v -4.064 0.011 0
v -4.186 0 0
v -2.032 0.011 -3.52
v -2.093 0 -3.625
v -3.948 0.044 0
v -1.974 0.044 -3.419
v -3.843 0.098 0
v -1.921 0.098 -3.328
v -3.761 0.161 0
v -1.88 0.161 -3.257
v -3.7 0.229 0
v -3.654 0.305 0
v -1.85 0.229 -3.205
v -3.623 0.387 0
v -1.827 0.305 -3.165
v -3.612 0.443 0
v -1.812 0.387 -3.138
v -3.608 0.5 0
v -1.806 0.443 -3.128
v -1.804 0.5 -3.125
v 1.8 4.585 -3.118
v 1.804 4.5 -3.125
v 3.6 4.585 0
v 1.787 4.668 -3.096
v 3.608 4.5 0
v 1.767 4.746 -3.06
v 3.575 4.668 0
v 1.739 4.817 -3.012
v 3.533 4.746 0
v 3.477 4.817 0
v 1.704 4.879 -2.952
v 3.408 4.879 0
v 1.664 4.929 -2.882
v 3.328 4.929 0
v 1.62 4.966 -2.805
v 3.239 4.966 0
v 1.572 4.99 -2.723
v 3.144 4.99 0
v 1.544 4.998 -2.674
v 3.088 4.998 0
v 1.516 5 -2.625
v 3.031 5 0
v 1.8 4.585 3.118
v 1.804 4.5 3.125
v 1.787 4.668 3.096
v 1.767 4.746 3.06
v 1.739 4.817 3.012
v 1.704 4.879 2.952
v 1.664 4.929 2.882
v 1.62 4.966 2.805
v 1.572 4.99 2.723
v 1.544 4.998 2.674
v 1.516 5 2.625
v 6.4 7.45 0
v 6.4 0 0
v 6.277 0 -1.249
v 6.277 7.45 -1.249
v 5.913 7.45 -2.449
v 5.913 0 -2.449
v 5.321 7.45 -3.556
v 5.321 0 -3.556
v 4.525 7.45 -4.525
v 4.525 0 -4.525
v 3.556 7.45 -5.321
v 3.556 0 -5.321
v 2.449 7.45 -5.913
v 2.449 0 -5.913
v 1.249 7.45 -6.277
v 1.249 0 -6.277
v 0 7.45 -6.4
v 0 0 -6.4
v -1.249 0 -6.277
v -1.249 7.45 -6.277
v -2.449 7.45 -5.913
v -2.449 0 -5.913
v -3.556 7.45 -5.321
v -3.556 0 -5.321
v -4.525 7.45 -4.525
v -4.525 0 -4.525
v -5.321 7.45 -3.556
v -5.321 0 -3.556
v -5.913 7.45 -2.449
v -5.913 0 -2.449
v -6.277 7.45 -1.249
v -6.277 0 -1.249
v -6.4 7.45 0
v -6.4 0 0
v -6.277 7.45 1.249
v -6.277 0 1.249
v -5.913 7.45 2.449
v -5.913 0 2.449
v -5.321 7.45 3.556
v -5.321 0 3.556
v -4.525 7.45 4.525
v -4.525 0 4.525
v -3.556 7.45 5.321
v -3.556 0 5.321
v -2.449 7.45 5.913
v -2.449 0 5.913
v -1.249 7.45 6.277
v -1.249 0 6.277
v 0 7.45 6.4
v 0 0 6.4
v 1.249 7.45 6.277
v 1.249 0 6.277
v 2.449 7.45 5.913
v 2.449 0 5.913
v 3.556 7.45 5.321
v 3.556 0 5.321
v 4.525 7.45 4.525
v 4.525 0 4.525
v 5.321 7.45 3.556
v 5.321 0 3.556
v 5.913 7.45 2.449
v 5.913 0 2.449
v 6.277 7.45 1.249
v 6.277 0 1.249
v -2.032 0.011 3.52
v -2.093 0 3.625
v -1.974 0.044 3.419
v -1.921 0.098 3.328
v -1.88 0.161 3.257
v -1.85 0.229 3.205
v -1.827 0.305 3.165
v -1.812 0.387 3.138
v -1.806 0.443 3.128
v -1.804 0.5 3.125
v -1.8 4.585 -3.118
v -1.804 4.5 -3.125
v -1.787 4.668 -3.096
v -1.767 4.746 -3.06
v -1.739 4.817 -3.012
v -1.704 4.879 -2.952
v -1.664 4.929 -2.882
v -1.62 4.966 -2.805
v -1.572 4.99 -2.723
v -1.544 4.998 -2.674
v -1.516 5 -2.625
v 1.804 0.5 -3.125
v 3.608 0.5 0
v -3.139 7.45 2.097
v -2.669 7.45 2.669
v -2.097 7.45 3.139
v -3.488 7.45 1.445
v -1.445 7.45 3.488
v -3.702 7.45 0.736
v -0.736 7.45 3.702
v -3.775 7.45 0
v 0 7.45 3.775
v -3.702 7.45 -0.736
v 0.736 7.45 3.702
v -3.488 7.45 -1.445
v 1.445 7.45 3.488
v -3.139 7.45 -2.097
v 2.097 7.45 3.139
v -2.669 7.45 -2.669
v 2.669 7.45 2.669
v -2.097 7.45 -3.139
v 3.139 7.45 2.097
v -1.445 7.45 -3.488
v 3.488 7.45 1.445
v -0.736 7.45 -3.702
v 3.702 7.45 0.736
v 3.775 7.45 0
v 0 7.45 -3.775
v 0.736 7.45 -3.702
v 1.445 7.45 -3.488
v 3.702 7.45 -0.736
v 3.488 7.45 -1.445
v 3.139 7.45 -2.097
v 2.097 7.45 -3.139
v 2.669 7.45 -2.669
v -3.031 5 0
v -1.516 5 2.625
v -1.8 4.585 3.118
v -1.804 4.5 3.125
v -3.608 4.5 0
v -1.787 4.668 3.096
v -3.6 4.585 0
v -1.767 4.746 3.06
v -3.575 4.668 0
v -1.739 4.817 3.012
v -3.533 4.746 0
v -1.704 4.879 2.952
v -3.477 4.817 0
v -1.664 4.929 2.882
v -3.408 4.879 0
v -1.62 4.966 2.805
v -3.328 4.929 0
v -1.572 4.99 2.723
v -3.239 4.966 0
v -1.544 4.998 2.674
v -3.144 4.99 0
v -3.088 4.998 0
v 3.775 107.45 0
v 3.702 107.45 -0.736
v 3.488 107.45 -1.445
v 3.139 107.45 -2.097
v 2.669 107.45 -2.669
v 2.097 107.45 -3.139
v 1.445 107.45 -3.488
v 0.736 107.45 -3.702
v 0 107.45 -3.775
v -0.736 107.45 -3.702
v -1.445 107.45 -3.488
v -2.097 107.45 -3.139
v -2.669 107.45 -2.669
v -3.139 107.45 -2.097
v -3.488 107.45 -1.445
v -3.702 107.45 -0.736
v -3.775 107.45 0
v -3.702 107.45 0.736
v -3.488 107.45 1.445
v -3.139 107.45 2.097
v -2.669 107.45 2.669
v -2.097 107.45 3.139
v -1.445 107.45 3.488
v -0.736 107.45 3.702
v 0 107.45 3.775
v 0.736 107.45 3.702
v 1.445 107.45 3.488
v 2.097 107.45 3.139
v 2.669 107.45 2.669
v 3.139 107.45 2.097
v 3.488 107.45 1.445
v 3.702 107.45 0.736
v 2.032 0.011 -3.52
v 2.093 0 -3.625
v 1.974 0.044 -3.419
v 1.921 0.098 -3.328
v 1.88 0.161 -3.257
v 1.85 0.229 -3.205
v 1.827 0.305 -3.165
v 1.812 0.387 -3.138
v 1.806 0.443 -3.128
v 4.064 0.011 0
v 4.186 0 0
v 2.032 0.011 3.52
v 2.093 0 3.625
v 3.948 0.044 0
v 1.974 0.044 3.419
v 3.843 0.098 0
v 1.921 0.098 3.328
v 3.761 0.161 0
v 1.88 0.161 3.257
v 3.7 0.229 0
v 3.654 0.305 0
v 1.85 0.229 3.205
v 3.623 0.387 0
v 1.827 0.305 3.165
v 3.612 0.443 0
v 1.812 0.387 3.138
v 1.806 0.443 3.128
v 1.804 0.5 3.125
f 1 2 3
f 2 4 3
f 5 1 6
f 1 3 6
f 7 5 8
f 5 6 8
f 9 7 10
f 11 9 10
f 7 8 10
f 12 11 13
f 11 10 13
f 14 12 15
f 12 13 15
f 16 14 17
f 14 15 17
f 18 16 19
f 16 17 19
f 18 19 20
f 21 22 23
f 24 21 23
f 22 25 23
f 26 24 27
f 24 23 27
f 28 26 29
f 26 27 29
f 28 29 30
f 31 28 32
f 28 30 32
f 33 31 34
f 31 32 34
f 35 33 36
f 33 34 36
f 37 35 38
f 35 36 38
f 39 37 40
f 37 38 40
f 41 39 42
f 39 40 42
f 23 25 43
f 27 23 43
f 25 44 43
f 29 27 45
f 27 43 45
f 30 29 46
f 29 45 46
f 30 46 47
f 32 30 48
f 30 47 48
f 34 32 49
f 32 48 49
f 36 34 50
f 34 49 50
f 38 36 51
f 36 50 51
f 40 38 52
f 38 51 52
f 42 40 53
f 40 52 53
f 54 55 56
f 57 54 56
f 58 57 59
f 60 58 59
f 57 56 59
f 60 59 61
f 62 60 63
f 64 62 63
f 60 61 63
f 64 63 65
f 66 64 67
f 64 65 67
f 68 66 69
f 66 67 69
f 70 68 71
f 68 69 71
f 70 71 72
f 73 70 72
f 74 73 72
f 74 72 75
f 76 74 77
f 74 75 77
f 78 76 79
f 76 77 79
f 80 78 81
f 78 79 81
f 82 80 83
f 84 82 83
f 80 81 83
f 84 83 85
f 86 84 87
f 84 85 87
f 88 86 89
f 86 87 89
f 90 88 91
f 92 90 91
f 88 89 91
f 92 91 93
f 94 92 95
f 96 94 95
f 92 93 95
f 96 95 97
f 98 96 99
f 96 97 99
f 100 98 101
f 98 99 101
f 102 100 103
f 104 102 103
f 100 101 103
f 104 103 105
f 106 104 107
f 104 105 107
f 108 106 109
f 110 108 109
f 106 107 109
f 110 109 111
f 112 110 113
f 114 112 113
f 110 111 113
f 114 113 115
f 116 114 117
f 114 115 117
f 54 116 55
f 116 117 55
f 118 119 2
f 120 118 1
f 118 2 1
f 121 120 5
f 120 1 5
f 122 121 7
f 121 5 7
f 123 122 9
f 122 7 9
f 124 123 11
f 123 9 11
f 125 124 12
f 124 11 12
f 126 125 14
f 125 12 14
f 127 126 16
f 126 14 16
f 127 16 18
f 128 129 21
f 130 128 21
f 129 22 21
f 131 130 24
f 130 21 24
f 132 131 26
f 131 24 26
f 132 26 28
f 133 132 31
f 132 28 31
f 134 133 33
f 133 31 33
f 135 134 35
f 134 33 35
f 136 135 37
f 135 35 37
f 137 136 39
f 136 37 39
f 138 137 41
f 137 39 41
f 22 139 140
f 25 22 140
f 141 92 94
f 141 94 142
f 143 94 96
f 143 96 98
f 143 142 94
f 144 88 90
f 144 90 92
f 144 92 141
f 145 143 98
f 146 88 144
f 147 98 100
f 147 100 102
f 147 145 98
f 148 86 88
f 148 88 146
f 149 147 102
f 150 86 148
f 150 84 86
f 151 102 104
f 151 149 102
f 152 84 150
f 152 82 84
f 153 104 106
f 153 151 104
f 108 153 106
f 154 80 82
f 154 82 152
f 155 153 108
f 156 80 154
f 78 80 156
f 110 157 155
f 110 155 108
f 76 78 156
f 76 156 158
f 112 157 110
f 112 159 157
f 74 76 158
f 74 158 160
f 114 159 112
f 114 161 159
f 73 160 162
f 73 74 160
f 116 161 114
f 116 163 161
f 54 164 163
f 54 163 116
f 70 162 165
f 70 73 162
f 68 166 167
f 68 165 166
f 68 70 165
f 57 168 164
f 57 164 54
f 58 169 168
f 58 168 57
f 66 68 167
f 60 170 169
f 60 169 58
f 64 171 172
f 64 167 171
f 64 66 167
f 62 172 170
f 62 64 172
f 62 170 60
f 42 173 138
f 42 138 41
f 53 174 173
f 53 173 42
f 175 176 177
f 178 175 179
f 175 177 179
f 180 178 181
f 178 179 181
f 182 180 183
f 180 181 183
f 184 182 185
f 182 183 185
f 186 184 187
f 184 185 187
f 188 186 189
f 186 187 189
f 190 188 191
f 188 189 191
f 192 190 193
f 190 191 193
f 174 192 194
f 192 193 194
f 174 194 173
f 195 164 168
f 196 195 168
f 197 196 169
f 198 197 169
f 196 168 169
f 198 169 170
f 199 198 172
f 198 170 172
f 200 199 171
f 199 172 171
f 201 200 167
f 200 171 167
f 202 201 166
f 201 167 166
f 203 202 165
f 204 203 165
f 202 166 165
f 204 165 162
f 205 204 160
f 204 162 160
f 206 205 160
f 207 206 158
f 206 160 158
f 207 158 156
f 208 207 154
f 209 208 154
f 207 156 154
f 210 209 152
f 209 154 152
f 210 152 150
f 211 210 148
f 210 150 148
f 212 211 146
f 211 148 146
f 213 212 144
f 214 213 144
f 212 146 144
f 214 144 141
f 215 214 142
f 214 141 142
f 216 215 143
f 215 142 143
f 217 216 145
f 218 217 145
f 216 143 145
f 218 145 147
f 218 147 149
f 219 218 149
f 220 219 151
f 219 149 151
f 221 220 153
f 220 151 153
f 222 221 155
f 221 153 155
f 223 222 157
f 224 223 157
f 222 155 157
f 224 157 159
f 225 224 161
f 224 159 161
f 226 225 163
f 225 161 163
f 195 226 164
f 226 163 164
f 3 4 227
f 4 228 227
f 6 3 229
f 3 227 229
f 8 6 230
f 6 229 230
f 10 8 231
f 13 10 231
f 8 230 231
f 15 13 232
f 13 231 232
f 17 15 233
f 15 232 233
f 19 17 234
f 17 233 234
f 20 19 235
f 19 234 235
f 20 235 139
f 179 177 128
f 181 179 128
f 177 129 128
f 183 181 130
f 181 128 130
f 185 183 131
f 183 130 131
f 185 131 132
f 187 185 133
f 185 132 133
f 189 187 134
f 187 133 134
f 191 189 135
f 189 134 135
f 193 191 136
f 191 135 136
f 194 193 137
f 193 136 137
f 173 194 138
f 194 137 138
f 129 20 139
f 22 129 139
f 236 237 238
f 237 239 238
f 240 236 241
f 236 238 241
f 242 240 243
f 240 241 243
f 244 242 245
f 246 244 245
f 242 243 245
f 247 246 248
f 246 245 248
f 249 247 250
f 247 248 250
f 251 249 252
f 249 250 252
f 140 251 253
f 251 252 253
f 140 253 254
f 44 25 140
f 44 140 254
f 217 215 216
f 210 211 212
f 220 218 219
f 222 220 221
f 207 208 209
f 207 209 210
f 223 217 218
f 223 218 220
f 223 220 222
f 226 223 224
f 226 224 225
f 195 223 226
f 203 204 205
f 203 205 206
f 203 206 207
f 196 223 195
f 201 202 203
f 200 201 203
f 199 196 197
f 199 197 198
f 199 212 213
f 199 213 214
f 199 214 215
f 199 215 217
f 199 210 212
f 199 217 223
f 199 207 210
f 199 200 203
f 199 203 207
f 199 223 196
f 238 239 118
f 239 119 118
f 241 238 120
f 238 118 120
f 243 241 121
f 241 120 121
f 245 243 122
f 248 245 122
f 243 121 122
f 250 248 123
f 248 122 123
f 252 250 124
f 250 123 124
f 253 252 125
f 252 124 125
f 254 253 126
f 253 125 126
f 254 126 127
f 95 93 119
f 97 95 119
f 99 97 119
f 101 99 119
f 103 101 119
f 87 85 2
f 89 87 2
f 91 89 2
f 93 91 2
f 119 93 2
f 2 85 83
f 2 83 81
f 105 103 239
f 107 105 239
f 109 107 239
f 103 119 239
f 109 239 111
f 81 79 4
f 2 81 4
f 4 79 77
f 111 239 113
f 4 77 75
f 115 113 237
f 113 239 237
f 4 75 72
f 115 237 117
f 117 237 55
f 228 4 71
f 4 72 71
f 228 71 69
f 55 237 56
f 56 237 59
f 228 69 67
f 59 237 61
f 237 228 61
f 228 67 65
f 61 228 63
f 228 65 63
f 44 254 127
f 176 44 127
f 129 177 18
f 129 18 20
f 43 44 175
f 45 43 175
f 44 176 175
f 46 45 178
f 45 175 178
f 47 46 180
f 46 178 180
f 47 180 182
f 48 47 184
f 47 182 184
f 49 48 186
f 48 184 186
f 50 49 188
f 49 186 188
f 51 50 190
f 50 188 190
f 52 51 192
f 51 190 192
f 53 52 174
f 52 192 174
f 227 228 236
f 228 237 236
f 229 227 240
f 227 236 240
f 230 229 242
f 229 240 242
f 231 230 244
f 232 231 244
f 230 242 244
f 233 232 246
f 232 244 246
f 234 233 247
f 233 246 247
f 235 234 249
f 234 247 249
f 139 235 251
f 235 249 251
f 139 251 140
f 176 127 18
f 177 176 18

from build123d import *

# Parameters (mm, degrees)
SKETCH1_R           = 6.4
BOSS_EXTRUDE1_DEPTH = 7.45
SKETCH2_R           = 3.775
BOSS_EXTRUDE2_DEPTH = 100
CUT_EXTRUDE1_DEPTH  = 5
FILLET2_R           = 0.5
FILLET3_R           = 0.5


with BuildPart() as part:
    # Sketch1 → Boss-Extrude1 (new body)
    with BuildSketch(Plane(origin=(0, 0, 0), x_dir=(1, 0, 0), z_dir=(0, 1, 0))):
        Circle(SKETCH1_R)
    extrude(amount=BOSS_EXTRUDE1_DEPTH)

    # Sketch2 → Boss-Extrude2 (add)
    with BuildSketch(Plane(origin=(0, 7.45, 0), x_dir=(1, 0, 0), z_dir=(0, 1, 0))):
        Circle(SKETCH2_R)
    extrude(amount=BOSS_EXTRUDE2_DEPTH)

    # Sketch3 → Cut-Extrude1 (cut)
    with BuildSketch(Plane.XZ):
        Polygon((-3.608439182, 0), (-1.804219591, -3.125), (1.804219591, -3.125), (3.608439182, 0), (1.804219591, 3.125), (-1.804219591, 3.125), align=None)
    extrude(amount=-CUT_EXTRUDE1_DEPTH, mode=Mode.SUBTRACT)

    # Fillet2
    fillet2_edges = [part.edges().sort_by_distance(p)[0] for p in [
        (-2.706329387, 0, 1.5625),
        (-2.706329387, 0, -1.5625),
        (0, 0, -3.125),
        (2.706329387, 0, -1.5625),
        (2.706329387, 0, 1.5625),
        (0, 0, 3.125),
    ]]
    fillet(fillet2_edges, radius=FILLET2_R)

    # Fillet3
    fillet3_edges = [part.edges().sort_by_distance(p)[0] for p in [
        (-2.706329387, 5, 1.5625),
        (0, 5, 3.125),
        (2.706329387, 5, 1.5625),
        (2.706329387, 5, -1.5625),
        (0, 5, -3.125),
        (-2.706329387, 5, -1.5625),
    ]]
    fillet(fillet3_edges, radius=FILLET3_R)


solid = part.part
